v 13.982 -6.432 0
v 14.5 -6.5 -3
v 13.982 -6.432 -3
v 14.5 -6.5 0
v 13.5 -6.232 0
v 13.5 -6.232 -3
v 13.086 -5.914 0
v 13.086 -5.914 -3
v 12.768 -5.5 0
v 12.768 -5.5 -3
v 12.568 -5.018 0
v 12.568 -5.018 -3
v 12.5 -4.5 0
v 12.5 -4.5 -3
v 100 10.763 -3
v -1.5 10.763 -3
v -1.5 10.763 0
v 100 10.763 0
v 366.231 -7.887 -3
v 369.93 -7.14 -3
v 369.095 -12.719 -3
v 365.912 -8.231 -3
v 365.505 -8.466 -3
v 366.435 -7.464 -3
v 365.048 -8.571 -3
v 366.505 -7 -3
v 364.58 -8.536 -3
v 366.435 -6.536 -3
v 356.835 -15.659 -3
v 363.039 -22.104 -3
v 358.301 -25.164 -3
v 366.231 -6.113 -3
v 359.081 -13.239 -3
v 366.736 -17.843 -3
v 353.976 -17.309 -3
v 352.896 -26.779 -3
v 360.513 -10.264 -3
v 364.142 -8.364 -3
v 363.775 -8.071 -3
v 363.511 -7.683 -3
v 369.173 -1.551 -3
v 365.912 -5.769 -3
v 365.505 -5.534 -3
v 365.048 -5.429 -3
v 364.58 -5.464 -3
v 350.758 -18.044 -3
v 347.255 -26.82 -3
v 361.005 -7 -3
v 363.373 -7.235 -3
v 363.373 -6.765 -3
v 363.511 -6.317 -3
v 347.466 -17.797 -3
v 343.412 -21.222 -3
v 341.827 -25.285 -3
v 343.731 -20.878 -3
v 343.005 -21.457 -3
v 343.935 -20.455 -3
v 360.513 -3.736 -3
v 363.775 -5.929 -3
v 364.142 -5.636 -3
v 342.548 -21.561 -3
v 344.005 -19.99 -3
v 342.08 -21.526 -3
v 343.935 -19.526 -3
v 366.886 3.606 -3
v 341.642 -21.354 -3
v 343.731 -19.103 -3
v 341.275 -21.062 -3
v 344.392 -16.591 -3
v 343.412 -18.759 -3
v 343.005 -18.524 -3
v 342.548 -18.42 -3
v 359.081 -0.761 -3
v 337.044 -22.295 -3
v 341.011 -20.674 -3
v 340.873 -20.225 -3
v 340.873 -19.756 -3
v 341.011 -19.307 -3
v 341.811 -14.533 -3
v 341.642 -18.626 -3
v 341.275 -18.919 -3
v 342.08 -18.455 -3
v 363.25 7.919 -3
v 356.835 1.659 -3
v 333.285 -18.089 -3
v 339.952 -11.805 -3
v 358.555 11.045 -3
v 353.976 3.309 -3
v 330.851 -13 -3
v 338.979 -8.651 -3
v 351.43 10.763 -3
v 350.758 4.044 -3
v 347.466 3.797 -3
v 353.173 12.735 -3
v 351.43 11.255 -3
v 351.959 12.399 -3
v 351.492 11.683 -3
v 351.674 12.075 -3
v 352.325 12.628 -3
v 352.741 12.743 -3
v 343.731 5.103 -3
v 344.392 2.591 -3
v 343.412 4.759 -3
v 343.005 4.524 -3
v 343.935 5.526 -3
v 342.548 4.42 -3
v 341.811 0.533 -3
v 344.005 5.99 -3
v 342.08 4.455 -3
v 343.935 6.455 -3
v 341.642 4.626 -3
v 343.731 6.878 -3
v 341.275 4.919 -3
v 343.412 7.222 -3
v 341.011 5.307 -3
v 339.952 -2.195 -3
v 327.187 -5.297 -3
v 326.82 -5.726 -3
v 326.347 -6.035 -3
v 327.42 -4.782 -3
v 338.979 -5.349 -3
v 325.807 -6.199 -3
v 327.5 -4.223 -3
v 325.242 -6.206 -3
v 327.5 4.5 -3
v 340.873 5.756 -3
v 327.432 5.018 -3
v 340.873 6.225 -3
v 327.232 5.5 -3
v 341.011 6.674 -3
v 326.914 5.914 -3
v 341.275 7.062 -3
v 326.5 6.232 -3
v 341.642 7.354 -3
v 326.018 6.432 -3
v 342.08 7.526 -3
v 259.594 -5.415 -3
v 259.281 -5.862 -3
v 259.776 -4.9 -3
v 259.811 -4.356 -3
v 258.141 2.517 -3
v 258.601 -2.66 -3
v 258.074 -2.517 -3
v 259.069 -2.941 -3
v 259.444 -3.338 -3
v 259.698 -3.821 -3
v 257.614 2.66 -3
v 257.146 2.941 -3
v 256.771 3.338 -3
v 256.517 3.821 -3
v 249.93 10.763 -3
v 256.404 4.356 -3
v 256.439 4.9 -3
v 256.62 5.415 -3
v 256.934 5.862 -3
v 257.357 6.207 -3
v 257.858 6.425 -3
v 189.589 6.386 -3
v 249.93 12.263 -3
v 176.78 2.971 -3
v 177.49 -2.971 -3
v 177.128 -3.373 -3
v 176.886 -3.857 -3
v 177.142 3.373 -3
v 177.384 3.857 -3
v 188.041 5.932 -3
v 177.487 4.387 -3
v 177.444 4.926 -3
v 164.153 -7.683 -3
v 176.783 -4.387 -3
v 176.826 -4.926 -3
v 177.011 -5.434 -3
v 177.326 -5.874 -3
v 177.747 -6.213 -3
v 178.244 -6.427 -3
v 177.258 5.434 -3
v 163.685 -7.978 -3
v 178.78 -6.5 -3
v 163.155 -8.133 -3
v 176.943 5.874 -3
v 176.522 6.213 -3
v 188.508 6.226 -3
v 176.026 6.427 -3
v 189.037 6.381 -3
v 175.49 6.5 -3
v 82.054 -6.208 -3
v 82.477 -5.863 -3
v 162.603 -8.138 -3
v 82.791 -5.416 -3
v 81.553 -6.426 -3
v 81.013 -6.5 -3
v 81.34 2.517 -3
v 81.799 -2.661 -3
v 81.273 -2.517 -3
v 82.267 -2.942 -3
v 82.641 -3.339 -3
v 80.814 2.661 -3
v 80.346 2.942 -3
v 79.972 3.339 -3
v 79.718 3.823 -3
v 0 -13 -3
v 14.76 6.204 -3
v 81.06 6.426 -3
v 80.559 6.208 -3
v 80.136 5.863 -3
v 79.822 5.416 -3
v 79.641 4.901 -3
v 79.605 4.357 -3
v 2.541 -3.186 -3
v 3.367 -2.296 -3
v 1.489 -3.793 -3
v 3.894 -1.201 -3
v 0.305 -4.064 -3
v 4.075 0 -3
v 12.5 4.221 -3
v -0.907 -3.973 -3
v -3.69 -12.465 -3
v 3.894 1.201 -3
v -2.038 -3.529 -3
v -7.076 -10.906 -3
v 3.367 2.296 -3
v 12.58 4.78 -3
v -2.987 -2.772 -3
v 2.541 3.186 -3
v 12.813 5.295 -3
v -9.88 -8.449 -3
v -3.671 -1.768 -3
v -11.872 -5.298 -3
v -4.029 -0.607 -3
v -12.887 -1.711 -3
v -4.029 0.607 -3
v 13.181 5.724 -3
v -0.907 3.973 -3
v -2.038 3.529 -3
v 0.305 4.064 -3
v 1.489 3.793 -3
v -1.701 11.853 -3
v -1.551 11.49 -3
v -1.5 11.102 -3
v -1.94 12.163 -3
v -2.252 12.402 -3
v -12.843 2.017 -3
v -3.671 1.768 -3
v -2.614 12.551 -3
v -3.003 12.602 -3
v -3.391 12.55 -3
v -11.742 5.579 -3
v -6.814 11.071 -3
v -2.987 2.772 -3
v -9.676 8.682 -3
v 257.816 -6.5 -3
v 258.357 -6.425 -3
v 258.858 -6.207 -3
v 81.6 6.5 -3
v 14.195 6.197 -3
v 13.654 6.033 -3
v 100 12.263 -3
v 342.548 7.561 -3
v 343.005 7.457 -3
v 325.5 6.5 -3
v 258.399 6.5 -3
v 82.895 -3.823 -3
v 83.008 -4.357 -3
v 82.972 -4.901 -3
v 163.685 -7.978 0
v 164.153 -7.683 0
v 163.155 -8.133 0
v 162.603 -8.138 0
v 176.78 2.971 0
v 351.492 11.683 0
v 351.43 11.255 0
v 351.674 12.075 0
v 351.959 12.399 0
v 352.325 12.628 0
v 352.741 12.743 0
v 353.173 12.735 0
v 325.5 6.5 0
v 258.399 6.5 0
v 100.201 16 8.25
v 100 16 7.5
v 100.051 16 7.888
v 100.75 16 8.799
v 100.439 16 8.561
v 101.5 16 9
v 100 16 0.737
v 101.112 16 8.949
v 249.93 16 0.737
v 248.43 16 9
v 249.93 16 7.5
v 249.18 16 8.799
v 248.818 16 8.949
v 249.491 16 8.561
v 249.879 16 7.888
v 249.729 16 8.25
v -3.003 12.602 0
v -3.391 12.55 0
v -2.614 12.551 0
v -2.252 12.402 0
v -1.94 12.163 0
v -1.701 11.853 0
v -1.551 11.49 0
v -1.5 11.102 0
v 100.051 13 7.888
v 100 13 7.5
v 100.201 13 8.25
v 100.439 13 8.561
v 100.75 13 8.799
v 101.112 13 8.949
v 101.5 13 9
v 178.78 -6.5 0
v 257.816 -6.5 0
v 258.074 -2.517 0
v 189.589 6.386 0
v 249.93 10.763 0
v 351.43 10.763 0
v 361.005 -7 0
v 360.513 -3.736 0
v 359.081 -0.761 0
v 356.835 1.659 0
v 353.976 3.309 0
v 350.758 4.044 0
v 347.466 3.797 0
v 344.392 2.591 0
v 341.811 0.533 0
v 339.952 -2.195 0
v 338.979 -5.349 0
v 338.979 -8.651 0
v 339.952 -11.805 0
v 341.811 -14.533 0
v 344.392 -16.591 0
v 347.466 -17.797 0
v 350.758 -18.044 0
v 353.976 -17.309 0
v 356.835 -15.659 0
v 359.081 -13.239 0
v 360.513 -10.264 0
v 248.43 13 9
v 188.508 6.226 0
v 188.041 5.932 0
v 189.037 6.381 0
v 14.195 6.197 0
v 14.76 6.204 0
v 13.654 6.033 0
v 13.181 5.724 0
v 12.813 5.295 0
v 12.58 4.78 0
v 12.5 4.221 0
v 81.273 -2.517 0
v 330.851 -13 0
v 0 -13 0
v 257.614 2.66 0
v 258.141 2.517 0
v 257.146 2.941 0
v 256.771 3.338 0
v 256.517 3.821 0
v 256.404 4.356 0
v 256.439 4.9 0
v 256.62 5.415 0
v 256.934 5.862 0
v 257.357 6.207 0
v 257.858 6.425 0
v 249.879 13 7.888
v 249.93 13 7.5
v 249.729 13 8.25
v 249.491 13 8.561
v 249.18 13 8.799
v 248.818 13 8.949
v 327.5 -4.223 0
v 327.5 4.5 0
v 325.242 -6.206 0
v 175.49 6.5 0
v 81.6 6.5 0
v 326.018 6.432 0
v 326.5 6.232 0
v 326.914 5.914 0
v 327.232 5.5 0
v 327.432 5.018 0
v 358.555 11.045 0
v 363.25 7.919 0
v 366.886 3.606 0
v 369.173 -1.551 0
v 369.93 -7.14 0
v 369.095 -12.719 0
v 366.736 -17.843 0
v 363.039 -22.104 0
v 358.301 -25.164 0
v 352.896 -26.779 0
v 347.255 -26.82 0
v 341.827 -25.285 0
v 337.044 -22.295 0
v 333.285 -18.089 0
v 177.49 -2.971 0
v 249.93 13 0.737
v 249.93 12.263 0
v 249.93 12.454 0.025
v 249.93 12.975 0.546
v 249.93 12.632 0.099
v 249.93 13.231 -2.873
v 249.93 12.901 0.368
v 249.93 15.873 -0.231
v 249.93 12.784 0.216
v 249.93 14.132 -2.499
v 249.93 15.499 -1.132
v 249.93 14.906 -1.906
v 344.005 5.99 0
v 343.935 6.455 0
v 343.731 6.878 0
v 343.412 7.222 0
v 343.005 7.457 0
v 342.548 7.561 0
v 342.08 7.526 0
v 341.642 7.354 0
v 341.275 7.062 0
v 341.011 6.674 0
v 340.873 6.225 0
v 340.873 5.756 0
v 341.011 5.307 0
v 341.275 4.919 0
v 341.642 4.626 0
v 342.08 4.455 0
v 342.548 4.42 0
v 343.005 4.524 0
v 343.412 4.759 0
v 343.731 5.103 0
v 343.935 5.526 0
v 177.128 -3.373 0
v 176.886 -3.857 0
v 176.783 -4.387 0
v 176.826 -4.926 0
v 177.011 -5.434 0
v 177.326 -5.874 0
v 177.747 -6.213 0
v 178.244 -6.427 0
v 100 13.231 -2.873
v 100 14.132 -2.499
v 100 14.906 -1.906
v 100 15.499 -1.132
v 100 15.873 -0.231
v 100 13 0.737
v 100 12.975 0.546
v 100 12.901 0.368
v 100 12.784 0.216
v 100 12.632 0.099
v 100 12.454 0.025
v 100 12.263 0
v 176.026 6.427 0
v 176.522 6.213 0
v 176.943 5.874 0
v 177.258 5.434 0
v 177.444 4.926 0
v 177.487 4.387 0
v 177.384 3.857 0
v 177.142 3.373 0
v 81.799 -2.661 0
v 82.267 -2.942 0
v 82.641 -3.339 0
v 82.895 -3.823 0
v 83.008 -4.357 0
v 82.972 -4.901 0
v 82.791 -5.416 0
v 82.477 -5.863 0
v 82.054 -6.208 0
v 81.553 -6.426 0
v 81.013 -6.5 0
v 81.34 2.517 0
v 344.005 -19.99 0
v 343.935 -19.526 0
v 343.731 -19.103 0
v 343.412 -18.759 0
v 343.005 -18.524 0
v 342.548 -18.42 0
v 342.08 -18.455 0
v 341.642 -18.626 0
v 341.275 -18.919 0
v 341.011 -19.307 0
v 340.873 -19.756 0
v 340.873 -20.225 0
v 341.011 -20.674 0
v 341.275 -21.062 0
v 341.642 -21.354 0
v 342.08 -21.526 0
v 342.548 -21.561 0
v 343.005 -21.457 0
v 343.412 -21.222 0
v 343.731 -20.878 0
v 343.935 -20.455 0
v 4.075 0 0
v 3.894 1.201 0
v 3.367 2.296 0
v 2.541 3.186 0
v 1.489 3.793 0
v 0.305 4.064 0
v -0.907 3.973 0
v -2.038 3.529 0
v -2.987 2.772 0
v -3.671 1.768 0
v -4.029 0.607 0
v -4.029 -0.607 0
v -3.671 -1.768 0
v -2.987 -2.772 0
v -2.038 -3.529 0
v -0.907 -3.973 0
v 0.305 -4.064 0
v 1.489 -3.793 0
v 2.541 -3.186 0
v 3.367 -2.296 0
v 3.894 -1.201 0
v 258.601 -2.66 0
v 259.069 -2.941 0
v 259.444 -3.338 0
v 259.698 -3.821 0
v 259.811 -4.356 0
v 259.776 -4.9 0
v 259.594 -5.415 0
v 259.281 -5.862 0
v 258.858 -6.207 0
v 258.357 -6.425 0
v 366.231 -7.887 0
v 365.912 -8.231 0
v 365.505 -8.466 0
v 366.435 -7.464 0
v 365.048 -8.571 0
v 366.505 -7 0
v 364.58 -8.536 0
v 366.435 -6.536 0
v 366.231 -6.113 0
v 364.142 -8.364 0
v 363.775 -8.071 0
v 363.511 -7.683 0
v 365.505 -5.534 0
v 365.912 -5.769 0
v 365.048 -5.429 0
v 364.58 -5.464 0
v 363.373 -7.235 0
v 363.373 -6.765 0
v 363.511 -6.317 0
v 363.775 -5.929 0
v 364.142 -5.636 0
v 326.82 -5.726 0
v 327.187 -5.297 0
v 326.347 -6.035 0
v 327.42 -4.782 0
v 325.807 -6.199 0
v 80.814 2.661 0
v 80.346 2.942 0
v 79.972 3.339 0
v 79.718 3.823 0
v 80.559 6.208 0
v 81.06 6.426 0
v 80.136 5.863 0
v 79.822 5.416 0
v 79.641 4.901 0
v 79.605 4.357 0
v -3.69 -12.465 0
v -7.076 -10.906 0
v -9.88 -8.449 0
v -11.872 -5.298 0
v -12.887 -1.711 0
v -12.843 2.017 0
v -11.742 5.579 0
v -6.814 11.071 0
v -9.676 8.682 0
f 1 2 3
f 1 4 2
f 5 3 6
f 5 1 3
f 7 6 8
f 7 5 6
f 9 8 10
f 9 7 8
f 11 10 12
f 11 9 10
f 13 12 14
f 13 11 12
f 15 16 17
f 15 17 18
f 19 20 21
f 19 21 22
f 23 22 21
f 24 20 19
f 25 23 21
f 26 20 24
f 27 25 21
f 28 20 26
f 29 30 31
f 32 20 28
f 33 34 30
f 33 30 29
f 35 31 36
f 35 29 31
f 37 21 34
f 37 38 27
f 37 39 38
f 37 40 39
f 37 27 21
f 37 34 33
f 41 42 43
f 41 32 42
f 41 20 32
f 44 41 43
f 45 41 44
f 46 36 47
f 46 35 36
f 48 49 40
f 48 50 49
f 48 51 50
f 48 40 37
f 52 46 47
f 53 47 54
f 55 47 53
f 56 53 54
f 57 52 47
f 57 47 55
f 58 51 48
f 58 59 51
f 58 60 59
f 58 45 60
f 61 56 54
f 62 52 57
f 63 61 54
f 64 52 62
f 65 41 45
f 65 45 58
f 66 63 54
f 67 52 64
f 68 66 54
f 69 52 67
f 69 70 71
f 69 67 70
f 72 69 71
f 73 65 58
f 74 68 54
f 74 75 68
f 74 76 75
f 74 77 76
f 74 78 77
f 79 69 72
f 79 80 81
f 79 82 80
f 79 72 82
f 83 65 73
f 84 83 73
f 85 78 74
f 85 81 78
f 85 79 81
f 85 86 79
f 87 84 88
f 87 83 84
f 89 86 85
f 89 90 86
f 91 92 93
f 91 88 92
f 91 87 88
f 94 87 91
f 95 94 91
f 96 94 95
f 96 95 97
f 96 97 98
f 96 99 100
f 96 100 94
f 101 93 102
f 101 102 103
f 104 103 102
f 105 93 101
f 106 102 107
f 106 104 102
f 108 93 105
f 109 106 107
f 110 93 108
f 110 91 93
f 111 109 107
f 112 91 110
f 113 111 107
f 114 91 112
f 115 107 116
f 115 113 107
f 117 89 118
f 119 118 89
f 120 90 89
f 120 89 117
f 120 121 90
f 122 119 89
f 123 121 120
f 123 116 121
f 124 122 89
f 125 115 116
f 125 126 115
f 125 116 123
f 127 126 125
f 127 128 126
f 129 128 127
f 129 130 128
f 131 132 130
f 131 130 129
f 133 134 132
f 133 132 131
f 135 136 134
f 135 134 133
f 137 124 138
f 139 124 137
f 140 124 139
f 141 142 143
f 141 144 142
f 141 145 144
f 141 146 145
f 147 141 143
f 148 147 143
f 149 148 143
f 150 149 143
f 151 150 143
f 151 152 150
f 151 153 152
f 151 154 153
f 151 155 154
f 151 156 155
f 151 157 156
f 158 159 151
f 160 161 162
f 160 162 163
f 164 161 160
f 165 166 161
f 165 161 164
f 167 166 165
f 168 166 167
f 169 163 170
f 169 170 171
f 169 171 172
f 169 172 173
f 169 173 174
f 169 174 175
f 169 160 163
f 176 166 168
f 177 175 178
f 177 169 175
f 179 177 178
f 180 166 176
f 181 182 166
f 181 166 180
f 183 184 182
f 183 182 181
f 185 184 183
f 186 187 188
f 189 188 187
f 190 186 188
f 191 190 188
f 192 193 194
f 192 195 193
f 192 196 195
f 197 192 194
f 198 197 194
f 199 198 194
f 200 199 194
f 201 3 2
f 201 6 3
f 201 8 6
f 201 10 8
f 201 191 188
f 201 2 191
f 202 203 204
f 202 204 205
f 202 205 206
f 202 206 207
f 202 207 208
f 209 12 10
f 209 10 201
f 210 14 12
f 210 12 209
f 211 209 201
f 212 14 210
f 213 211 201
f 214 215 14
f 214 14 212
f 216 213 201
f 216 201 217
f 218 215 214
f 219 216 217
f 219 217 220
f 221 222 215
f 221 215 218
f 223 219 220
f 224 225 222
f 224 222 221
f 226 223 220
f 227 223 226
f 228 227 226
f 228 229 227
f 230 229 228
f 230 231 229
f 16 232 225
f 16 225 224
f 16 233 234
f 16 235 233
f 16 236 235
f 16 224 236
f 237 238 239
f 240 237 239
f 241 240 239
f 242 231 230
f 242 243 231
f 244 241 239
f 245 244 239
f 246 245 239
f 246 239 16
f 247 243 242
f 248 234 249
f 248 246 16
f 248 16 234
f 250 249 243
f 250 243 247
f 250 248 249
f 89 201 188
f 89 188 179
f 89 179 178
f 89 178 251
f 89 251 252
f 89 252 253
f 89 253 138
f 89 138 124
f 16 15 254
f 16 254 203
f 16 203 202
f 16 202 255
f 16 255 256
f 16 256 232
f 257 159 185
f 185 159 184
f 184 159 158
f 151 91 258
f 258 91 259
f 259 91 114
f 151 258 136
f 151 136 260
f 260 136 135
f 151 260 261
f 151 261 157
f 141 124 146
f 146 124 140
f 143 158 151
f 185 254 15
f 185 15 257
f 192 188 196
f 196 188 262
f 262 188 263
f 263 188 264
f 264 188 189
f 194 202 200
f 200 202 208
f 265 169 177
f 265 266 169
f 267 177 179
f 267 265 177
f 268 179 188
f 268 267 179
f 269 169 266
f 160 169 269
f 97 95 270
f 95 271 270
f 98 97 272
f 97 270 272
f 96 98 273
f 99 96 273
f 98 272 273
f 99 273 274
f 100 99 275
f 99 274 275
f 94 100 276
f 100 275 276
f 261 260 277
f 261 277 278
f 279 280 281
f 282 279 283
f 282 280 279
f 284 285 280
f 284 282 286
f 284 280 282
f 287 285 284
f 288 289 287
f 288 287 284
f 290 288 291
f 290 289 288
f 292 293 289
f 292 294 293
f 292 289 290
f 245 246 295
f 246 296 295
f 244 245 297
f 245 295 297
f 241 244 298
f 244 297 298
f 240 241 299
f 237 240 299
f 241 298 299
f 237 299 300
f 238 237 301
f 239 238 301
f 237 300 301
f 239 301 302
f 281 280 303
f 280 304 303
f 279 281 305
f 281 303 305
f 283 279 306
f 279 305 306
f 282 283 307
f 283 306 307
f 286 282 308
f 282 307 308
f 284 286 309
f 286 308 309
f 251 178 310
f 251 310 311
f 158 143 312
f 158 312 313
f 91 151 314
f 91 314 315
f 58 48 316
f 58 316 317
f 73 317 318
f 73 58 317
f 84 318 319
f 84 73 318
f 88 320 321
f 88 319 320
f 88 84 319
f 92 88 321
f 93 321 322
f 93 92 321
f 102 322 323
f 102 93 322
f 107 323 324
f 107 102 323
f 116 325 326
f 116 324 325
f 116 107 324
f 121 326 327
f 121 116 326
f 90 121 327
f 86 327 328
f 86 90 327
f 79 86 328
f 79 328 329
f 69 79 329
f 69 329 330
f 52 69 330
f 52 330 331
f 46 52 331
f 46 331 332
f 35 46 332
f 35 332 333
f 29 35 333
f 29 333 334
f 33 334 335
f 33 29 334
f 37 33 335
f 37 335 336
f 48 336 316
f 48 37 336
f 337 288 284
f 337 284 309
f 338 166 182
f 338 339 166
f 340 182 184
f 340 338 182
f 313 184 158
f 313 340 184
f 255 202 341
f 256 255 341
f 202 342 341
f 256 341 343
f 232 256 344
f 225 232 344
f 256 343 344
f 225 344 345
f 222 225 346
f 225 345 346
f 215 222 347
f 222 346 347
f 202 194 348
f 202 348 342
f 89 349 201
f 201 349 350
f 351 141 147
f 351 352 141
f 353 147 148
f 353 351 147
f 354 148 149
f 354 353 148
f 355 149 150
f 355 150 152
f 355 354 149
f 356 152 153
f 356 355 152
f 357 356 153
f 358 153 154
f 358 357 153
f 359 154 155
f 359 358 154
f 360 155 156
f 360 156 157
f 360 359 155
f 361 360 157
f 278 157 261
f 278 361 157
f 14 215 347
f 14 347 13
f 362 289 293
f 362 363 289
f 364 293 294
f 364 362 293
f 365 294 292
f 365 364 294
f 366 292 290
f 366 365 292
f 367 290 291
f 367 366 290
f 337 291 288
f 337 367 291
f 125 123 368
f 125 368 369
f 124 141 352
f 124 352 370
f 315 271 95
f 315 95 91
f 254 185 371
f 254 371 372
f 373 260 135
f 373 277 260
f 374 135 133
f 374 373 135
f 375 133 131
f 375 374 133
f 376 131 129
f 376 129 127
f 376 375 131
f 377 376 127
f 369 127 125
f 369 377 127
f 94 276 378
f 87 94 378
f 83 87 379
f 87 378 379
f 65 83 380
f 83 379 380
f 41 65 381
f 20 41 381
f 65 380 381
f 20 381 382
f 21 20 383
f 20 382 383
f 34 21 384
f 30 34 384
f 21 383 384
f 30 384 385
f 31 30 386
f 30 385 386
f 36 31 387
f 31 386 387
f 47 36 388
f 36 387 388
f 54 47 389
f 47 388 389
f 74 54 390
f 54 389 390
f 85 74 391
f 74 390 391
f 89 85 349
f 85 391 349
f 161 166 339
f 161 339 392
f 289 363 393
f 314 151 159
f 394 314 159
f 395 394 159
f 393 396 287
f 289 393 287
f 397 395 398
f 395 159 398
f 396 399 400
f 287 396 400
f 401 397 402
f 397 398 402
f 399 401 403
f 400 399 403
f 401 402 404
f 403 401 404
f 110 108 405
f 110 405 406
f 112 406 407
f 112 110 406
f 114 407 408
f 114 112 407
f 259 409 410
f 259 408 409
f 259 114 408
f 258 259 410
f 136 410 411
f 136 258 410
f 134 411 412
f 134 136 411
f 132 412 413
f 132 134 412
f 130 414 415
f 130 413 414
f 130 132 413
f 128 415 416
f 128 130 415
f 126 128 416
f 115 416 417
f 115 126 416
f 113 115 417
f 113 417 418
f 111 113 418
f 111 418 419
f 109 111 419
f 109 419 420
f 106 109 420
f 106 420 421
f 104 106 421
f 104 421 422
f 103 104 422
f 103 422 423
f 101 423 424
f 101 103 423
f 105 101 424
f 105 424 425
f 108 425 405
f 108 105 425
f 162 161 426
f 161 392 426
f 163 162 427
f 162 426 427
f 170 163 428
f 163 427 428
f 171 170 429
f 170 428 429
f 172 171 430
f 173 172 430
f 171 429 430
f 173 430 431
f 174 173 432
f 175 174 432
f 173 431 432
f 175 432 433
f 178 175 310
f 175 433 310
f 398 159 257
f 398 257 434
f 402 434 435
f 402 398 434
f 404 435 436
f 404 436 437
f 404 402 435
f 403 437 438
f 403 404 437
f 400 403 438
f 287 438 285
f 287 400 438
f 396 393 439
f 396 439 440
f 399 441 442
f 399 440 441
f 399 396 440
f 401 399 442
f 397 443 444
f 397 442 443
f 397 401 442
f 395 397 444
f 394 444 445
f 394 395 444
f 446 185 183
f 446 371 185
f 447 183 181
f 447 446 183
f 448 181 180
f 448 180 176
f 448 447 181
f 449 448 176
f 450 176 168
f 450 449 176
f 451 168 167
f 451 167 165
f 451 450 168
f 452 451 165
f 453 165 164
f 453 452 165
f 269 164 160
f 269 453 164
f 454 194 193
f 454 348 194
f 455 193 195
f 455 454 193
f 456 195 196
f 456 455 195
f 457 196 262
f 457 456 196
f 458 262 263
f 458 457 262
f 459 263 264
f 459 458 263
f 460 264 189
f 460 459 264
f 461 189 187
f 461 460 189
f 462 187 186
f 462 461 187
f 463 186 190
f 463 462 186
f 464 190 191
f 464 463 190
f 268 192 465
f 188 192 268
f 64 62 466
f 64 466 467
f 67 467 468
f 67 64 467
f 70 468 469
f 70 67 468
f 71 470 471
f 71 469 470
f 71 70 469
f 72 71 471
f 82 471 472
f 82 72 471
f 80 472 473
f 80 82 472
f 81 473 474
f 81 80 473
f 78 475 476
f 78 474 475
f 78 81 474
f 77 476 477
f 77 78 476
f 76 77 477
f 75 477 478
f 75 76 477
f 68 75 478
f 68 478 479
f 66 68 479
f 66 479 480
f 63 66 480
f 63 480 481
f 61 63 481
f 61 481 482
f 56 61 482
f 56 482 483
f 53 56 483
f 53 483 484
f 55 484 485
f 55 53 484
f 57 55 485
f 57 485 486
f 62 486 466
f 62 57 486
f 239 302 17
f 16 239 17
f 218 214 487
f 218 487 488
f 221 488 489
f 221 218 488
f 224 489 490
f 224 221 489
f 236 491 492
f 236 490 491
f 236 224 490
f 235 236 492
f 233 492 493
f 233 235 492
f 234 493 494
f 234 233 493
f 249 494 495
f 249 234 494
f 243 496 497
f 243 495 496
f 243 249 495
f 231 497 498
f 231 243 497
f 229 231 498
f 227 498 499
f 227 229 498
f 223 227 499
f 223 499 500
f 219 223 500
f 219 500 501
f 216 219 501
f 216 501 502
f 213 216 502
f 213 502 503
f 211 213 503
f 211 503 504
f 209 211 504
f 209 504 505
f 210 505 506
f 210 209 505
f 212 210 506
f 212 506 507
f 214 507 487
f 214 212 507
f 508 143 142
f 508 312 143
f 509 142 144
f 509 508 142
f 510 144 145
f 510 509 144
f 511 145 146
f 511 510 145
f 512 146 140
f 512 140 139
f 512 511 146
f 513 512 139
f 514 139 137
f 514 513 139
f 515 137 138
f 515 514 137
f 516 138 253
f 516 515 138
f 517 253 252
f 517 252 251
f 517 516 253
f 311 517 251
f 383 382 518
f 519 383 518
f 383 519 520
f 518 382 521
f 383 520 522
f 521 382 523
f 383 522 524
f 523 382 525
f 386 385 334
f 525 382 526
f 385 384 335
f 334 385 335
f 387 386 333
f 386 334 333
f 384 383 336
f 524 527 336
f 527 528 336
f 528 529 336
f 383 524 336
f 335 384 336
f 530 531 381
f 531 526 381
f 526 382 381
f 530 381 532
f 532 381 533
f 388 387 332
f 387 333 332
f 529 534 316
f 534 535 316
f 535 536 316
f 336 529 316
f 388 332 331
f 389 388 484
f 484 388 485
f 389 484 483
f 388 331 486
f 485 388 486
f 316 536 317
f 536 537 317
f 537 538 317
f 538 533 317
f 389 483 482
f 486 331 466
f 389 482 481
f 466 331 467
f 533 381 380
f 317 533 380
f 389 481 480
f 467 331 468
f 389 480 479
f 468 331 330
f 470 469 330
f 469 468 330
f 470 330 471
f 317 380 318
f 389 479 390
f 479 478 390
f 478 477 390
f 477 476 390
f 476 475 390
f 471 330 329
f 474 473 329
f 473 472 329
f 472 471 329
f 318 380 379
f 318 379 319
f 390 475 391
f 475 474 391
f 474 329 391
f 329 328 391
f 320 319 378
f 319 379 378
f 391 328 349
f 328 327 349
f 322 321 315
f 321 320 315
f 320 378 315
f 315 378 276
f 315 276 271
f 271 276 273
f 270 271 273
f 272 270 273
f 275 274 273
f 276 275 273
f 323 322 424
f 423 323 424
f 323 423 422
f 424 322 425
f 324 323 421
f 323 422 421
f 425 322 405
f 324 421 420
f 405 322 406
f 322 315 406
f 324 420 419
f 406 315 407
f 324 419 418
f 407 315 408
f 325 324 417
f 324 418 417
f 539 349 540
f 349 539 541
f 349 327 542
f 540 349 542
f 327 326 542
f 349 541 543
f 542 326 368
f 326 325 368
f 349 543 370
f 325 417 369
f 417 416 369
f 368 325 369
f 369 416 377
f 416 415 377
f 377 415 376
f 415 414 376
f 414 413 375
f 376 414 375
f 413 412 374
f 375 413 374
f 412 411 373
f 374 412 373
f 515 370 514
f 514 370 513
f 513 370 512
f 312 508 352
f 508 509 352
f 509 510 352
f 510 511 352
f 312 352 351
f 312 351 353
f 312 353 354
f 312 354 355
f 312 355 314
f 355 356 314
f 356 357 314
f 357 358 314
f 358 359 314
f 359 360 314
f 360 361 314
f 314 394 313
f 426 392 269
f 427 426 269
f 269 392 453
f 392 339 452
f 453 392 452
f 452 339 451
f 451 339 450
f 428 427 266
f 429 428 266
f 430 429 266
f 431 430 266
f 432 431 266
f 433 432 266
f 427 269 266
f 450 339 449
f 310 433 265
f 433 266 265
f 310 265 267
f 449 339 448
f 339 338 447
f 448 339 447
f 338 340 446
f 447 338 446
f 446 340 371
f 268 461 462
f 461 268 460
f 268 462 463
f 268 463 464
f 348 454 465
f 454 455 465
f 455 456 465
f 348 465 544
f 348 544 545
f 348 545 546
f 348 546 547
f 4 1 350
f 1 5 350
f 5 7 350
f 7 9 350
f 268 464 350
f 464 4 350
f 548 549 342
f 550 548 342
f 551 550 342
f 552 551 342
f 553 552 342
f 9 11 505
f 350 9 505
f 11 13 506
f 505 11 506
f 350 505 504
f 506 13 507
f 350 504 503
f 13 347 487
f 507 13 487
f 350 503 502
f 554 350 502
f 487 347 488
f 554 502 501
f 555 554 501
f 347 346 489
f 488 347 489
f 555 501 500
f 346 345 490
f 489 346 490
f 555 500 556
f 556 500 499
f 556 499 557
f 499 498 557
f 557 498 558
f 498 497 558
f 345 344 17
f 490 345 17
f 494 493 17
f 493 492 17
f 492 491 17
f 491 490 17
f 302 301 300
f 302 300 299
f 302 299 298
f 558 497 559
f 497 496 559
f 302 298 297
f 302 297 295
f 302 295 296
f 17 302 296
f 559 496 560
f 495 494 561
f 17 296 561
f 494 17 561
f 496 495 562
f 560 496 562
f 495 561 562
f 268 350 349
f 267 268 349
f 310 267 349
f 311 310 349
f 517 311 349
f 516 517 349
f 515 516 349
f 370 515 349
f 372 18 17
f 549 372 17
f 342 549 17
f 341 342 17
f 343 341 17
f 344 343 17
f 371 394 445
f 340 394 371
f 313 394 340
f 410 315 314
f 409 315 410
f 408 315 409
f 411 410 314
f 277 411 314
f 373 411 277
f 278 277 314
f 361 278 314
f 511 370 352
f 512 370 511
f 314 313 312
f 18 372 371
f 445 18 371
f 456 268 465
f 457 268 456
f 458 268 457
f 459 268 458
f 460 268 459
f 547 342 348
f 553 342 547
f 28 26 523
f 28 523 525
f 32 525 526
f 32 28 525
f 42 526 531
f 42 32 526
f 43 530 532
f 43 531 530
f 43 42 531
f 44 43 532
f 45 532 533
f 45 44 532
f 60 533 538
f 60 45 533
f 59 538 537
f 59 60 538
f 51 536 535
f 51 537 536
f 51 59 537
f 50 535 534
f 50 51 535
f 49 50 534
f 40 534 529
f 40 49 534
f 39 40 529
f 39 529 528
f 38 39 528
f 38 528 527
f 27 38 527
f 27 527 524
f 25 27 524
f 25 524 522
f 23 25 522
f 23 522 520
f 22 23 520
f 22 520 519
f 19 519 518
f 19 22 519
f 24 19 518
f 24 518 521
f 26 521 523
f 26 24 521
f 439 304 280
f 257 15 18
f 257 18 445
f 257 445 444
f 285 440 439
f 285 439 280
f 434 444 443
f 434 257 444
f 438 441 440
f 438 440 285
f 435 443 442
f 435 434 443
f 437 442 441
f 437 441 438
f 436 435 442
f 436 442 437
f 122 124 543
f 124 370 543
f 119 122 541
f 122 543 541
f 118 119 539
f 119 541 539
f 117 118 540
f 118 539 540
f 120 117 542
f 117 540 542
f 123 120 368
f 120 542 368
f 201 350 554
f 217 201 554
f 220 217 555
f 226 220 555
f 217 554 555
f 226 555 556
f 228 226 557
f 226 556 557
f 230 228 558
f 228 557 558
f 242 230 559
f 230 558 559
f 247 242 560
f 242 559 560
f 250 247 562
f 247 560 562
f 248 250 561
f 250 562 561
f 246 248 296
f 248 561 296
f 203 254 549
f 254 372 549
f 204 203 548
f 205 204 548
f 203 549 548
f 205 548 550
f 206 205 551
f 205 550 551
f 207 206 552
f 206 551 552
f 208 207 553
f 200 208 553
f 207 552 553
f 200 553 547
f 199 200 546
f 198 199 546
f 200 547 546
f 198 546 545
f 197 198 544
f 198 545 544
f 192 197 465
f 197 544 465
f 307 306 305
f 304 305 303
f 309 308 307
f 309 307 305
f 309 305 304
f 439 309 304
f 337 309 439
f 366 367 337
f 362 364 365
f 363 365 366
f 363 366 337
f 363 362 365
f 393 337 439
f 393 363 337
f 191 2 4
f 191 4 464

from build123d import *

# Parameters (mm, degrees)
BASE_FLANGE1_DEPTH            = 3
EDGE_FLANGE2_STRIP_W          = 13.4732
EDGE_FLANGE2_STRIP_H          = 3
EDGE_FLANGE2_STRIP_CUT_DEPTH  = 349.93
EDGE_FLANGE2_RELIEF_W         = 14.9732
EDGE_FLANGE2_RELIEF_H         = 1.5
EDGE_FLANGE2_RELIEF_CUT_DEPTH = 3
EDGE_FLANGE2_DEPTH            = 349.93
CUT_EXTRUDE1_DEPTH            = 372.023186472
CUT_EXTRUDE1_DEPTH_BACK       = 372.023186472
SKETCH22_R                    = 4.075
SKETCH22_R_2                  = 11.075
SKETCH22_R_3                  = 1.575
CUT_EXTRUDE2_DEPTH            = 372.023186472
CUT_EXTRUDE2_DEPTH_BACK       = 372.023186472
FILLET1_R                     = 2
CUT_EXTRUDE3_DEPTH            = 372.023186472
CUT_EXTRUDE3_DEPTH_BACK       = 372.023186472
SKETCH24_W                    = 100
SKETCH24_H                    = 5.2366
FILLET2_R                     = 1.5


# Sheet-metal steps are written as plain solids
with BuildPart() as part:
    # Sketch1 → Base-Flange1 (new body)
    with BuildSketch(Plane.XY):
        with BuildLine():
            Line((0, 13), (349.93, 13))
            ThreePointArc((349.93, 13), (366.054515497, -18.832159566), (330.851215972, -13))
            Line((330.851215972, -13), (0, -13))
            ThreePointArc((0, -13), (-13, 0), (0, 13))
        make_face()
    extrude(amount=-BASE_FLANGE1_DEPTH)

    # Edge-Flange2 strip (across the edge) → Edge-Flange2 strip cut (cut)
    with BuildSketch(Plane(origin=(349.93, 13, 0), x_dir=(0, -1, 0), z_dir=(-1, 0, 0))):
        with Locations((-6, -1.5)):
            Rectangle(EDGE_FLANGE2_STRIP_W, EDGE_FLANGE2_STRIP_H)
    extrude(amount=EDGE_FLANGE2_STRIP_CUT_DEPTH, mode=Mode.SUBTRACT)

    # Edge-Flange2 relief (on the sheet) → Edge-Flange2 relief cut (cut)
    with BuildSketch(Plane(origin=(349.93, 12.2634, 0), x_dir=(0, -1, 0), z_dir=(0, 0, 1))):
        with Locations((-5.9866, 0.75)):
            Rectangle(EDGE_FLANGE2_RELIEF_W, EDGE_FLANGE2_RELIEF_H)
        with Locations((-5.9866, -350.68)):
            Rectangle(EDGE_FLANGE2_RELIEF_W, EDGE_FLANGE2_RELIEF_H)
    extrude(amount=-EDGE_FLANGE2_RELIEF_CUT_DEPTH, mode=Mode.SUBTRACT)

    # Edge-Flange2 section (across the edge) → Edge-Flange2 (add)
    with BuildSketch(Plane(origin=(349.93, 13, 0), x_dir=(0, -1, 0), z_dir=(-1, 0, 0))):
        with BuildLine():
            Line((-3, 0.7366), (-3, 9))
            Line((-3, 9), (0, 9))
            Line((0, 9), (0, 0.7366))
            ThreePointArc((0, 0.7366), (0.215745145, 0.215745145), (0.7366, 0))
            Line((0.7366, 0), (0.7366, -3))
            ThreePointArc((0.7366, -3), (-1.905575199, -1.905575199), (-3, 0.7366))
        make_face()
    extrude(amount=EDGE_FLANGE2_DEPTH)

    # Sketch22 → Cut-Extrude1 (cut, two sides: drawn at the far end of the back side and taken through both)
    with BuildSketch(Plane.XY.offset(-CUT_EXTRUDE1_DEPTH_BACK)):
        Circle(SKETCH22_R)
        with Locations((349.93, -7)):
            Circle(SKETCH22_R_2)
        with Locations((364.93, -7)):
            Circle(SKETCH22_R_3)
        with Locations((342.43, 5.990381057)):
            Circle(SKETCH22_R_3)
        with Locations((342.43, -19.990381057)):
            Circle(SKETCH22_R_3)
    extrude(amount=CUT_EXTRUDE1_DEPTH + CUT_EXTRUDE1_DEPTH_BACK, mode=Mode.SUBTRACT)

    # Sketch23 → Cut-Extrude2 (cut, two sides: drawn at the far end of the back side and taken through both)
    with BuildSketch(Plane.XY.offset(-CUT_EXTRUDE2_DEPTH_BACK)):
        Polygon((12.5, 6.5), (12.5, -6.5), (111.651399385, -6.5), align=None)
        Polygon((327.5, -6.5), (327.5, 6.5), (227.5, 6.5), align=None)
        Polygon((50.961538462, 6.5), (163.478075869, -8.252338296), (180.961538462, 6.5), align=None)
        Polygon((173.308112114, -6.5), (288.714823182, -6.5), (188.714823182, 6.5), align=None)
    extrude(amount=CUT_EXTRUDE2_DEPTH + CUT_EXTRUDE2_DEPTH_BACK, mode=Mode.SUBTRACT)

    # Fillet1
    fillet1_edges = [part.edges().sort_by_distance(p)[0] for p in [
        (327.5, -6.5, -1.5),
        (227.5, 6.5, -1.5),
        (327.5, 6.5, -1.5),
        (50.961538462, 6.5, -1.5),
        (180.961538462, 6.5, -1.5),
        (163.478075869, -8.252338296, -1.5),
        (173.308112114, -6.5, -1.5),
        (188.714823182, 6.5, -1.5),
        (288.714823182, -6.5, -1.5),
        (12.5, 6.5, -1.5),
        (111.651399385, -6.5, -1.5),
        (12.5, -6.5, -1.5),
        (349.93, 14.5, 9),
        (0, 14.5, 9),
    ]]
    fillet(fillet1_edges, radius=FILLET1_R)

    # Sketch24 → Cut-Extrude3 (cut, two sides: drawn at the far end of the back side and taken through both)
    with BuildSketch(Plane.XY.offset(-CUT_EXTRUDE3_DEPTH_BACK)):
        with Locations((50, 13.3817)):
            Rectangle(SKETCH24_W, SKETCH24_H)
        with Locations((299.93, 13.3817)):
            Rectangle(SKETCH24_W, SKETCH24_H)
    extrude(amount=CUT_EXTRUDE3_DEPTH + CUT_EXTRUDE3_DEPTH_BACK, mode=Mode.SUBTRACT)

    # Fillet2
    fillet2_edges = [part.edges().sort_by_distance(p)[0] for p in [
        (351.43, 12.943670675, -1.5),
        (-1.5, 12.91317157, -1.5),
        (100, 14.5, 9),
        (249.93, 14.5, 9),
    ]]
    fillet(fillet2_edges, radius=FILLET2_R)


solid = part.part
